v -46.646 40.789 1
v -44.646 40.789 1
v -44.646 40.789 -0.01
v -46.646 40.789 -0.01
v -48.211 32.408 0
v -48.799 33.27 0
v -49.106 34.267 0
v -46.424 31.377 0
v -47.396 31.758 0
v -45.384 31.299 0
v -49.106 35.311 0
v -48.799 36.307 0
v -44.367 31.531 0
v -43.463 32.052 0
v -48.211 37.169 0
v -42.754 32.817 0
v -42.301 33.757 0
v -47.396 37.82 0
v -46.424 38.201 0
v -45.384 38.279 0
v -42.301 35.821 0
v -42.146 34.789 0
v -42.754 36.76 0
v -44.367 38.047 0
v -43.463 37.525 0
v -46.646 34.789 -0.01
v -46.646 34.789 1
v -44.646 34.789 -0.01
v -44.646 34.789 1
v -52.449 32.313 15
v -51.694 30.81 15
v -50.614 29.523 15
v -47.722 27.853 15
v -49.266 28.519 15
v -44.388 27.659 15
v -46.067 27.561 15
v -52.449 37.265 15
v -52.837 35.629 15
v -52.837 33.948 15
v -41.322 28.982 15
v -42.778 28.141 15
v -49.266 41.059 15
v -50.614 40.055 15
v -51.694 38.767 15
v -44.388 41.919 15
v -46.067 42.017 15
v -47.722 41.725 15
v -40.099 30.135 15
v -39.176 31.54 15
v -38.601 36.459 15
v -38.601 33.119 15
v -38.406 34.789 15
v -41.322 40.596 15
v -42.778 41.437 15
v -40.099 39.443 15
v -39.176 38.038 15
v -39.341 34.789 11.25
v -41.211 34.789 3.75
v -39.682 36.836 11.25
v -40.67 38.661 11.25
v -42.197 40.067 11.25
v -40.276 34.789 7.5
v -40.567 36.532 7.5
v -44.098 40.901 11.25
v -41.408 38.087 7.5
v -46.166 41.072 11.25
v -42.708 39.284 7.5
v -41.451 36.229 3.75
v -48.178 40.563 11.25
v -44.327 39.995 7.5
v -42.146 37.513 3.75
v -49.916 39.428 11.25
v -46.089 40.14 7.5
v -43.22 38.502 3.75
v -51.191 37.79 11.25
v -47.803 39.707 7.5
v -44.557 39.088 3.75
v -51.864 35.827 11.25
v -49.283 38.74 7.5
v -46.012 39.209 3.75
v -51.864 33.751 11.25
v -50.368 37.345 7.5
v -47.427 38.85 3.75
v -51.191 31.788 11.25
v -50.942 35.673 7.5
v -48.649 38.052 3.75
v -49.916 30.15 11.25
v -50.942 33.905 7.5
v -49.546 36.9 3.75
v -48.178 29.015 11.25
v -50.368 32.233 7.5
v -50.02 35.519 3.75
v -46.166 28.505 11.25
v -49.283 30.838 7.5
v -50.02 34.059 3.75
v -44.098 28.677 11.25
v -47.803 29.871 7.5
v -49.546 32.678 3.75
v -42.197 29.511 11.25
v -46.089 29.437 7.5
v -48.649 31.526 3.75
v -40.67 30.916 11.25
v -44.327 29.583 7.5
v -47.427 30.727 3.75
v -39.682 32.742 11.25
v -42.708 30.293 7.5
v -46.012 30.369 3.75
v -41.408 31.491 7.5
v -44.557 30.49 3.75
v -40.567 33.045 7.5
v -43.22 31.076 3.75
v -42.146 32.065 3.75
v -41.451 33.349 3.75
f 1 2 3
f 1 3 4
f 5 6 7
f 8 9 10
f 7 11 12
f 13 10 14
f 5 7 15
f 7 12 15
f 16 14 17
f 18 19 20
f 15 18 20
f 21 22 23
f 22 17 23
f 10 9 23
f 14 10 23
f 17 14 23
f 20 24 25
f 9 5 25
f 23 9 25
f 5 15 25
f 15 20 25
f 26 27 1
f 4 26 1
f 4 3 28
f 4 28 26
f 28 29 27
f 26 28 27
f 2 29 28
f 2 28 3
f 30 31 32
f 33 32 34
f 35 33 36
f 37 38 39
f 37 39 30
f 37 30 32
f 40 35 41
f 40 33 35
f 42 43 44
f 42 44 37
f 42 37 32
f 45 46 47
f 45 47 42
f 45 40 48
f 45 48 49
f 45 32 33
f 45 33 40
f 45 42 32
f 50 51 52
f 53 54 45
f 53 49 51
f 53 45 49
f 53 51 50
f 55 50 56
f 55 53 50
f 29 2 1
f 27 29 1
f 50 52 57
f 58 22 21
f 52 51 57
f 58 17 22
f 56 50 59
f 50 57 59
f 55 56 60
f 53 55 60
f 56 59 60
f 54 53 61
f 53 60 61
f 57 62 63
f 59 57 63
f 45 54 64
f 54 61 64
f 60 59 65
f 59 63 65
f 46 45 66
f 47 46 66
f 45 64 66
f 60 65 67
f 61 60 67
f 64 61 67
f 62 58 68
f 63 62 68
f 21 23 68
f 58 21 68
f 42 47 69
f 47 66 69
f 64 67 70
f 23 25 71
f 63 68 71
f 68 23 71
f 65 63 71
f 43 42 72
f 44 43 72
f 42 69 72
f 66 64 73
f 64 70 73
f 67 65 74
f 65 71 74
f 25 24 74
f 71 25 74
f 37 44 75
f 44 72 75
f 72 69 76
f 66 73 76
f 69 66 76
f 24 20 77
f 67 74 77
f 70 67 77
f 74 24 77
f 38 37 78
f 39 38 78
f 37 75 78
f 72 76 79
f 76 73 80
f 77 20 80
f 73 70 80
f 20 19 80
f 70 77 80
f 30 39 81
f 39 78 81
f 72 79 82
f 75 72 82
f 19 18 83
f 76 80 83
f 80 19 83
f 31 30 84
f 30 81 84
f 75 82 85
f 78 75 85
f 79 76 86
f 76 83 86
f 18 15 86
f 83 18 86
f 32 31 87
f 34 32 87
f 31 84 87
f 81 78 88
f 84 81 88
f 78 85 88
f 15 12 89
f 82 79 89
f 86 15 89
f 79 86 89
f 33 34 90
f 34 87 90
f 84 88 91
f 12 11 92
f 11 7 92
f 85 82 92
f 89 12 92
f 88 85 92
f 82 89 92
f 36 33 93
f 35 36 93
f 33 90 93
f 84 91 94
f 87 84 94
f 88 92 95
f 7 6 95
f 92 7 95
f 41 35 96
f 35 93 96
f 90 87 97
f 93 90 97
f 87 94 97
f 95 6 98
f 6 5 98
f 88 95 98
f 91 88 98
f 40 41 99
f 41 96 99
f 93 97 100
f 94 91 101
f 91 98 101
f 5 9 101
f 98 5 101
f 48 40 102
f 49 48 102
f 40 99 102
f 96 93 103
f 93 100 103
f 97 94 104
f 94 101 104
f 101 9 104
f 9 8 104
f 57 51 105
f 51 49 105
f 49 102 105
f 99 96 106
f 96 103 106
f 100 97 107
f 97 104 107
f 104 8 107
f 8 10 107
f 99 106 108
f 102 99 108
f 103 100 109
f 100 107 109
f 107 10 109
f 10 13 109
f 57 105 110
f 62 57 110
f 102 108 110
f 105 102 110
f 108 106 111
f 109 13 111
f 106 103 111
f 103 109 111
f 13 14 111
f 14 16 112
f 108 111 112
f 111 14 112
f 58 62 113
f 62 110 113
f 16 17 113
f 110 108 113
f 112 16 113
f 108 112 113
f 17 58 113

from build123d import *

# Parameters (mm, degrees)
ESQUISSE1_R             = 3.5
BOSS_EXTRU_1_DEPTH      = 15
BOSS_EXTRU_1_DRAFT      = -14
BOSS_EXTRU_2_DEPTH      = 0.01
BOSS_EXTRU_2_DEPTH_BACK = 1
ESQUISSE2_W             = 2
ESQUISSE2_H             = 6


with BuildPart() as part:
    # Esquisse1 → Boss.-Extru.1 (with draft: the straight prism first)
    with BuildSketch(Plane.XY):
        with Locations((-45.645547355, 34.788865837)):
            Circle(ESQUISSE1_R)
    extrude(amount=BOSS_EXTRU_1_DEPTH)
    # Boss.-Extru.1: the draft: its side faces are tilted about the plane it starts from
    boss_extru_1_sides = [part.faces().sort_by_distance(p)[0] for p in [
        (-49.145547355, 34.788865837, 7.5),
    ]]
    draft(boss_extru_1_sides, Plane.XY, BOSS_EXTRU_1_DRAFT)


with BuildPart() as body_2:
    # Esquisse2 → Boss.-Extru.2 (new, two sides: drawn at the far end of the back side and taken through both)
    with BuildSketch(Plane(origin=(0, 0, 0), x_dir=(-1, 0, 0), z_dir=(0, 0, -1)).offset(-BOSS_EXTRU_2_DEPTH_BACK)):
        with Locations((45.645547355, 37.788865837)):
            Rectangle(ESQUISSE2_W, ESQUISSE2_H)
    extrude(amount=BOSS_EXTRU_2_DEPTH + BOSS_EXTRU_2_DEPTH_BACK)


solid = Compound([part.part, body_2.part])
